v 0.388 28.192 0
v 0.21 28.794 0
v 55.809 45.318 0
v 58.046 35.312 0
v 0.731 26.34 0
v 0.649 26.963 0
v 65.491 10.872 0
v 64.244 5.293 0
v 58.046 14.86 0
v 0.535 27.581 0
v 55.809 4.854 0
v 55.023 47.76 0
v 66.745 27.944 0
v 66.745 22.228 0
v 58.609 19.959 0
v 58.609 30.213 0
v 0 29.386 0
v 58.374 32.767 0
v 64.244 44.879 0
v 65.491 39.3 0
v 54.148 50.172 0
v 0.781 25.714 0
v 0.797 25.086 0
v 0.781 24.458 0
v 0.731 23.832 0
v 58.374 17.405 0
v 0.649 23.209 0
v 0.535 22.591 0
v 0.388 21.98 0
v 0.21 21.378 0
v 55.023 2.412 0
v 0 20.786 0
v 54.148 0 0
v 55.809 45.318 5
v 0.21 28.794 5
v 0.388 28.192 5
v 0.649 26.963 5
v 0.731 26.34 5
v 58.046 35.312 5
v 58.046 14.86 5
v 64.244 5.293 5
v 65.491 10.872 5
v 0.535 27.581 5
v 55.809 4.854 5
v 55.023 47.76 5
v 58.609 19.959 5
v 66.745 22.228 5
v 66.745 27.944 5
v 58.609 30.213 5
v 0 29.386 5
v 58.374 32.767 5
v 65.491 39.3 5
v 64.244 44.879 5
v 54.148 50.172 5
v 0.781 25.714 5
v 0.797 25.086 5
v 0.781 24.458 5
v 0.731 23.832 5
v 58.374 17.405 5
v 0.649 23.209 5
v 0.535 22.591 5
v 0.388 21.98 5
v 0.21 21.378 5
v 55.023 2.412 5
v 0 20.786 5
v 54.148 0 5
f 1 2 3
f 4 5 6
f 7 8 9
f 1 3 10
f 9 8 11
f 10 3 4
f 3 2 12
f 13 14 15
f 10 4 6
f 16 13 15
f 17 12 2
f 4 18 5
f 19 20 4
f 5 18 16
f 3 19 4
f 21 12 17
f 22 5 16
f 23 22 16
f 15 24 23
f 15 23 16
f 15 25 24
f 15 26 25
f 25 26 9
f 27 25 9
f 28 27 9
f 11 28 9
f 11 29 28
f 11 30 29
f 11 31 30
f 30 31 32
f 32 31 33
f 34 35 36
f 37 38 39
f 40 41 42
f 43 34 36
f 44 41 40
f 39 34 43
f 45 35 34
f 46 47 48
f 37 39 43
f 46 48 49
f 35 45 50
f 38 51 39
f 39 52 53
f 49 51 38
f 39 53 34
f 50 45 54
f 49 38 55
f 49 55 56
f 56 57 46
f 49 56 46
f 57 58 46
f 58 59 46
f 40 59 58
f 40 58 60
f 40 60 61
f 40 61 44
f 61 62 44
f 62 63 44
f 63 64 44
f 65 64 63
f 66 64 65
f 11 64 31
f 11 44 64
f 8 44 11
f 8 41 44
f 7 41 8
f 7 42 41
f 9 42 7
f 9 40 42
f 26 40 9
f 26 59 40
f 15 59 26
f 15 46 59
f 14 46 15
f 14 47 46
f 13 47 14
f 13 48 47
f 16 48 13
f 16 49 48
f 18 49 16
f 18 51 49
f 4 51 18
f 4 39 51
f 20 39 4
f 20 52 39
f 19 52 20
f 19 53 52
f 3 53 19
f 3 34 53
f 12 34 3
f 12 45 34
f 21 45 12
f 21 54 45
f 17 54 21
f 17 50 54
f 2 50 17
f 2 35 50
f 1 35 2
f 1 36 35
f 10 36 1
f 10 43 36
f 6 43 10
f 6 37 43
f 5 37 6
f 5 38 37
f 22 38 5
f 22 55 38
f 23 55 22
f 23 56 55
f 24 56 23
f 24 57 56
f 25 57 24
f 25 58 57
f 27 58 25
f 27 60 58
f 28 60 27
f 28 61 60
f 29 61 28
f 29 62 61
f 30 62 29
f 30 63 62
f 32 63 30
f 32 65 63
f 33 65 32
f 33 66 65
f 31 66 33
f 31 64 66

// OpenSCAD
$fn = 32;

// ----------------------------------------------------------------------
// Gear sector: 3 teeth on 42 degrees
// ----------------------------------------------------------------------

// --- parameters (mm) ---
sector_angle = 42;        // sector angle, degrees
root_r = 70;              // root circle radius
tooth_h = 8;              // tooth height over the root circle
teeth = 3;                // number of teeth on the sector
hub_r = 12;               // hub bore radius
plate_t = 5;              // sector thickness, Z
arc_step = 3;             // sampling step of the root/hub arcs, degrees

tip_r = root_r + tooth_h;  // tip circle radius

profile = [[54.148, 0], [55.023, 2.412], [55.809, 4.854], [64.244, 5.293], [65.491, 10.872], [58.046, 14.86], [58.374, 17.405], [58.609, 19.959], [66.745, 22.228], [66.745, 27.944], [58.609, 30.213], [58.374, 32.767], [58.046, 35.312], [65.491, 39.3], [64.244, 44.879], [55.809, 45.318], [55.023, 47.76], [54.148, 50.172], [0, 29.386], [0.21, 28.794], [0.388, 28.192], [0.535, 27.581], [0.649, 26.963], [0.731, 26.34], [0.781, 25.714], [0.797, 25.086], [0.781, 24.458], [0.731, 23.832], [0.649, 23.209], [0.535, 22.591], [0.388, 21.98], [0.21, 21.378], [0, 20.786]];  // primary outline, 33 points, counter clockwise

// --- the one profile operation ---
linear_extrude(height = plate_t) polygon(points = profile);
